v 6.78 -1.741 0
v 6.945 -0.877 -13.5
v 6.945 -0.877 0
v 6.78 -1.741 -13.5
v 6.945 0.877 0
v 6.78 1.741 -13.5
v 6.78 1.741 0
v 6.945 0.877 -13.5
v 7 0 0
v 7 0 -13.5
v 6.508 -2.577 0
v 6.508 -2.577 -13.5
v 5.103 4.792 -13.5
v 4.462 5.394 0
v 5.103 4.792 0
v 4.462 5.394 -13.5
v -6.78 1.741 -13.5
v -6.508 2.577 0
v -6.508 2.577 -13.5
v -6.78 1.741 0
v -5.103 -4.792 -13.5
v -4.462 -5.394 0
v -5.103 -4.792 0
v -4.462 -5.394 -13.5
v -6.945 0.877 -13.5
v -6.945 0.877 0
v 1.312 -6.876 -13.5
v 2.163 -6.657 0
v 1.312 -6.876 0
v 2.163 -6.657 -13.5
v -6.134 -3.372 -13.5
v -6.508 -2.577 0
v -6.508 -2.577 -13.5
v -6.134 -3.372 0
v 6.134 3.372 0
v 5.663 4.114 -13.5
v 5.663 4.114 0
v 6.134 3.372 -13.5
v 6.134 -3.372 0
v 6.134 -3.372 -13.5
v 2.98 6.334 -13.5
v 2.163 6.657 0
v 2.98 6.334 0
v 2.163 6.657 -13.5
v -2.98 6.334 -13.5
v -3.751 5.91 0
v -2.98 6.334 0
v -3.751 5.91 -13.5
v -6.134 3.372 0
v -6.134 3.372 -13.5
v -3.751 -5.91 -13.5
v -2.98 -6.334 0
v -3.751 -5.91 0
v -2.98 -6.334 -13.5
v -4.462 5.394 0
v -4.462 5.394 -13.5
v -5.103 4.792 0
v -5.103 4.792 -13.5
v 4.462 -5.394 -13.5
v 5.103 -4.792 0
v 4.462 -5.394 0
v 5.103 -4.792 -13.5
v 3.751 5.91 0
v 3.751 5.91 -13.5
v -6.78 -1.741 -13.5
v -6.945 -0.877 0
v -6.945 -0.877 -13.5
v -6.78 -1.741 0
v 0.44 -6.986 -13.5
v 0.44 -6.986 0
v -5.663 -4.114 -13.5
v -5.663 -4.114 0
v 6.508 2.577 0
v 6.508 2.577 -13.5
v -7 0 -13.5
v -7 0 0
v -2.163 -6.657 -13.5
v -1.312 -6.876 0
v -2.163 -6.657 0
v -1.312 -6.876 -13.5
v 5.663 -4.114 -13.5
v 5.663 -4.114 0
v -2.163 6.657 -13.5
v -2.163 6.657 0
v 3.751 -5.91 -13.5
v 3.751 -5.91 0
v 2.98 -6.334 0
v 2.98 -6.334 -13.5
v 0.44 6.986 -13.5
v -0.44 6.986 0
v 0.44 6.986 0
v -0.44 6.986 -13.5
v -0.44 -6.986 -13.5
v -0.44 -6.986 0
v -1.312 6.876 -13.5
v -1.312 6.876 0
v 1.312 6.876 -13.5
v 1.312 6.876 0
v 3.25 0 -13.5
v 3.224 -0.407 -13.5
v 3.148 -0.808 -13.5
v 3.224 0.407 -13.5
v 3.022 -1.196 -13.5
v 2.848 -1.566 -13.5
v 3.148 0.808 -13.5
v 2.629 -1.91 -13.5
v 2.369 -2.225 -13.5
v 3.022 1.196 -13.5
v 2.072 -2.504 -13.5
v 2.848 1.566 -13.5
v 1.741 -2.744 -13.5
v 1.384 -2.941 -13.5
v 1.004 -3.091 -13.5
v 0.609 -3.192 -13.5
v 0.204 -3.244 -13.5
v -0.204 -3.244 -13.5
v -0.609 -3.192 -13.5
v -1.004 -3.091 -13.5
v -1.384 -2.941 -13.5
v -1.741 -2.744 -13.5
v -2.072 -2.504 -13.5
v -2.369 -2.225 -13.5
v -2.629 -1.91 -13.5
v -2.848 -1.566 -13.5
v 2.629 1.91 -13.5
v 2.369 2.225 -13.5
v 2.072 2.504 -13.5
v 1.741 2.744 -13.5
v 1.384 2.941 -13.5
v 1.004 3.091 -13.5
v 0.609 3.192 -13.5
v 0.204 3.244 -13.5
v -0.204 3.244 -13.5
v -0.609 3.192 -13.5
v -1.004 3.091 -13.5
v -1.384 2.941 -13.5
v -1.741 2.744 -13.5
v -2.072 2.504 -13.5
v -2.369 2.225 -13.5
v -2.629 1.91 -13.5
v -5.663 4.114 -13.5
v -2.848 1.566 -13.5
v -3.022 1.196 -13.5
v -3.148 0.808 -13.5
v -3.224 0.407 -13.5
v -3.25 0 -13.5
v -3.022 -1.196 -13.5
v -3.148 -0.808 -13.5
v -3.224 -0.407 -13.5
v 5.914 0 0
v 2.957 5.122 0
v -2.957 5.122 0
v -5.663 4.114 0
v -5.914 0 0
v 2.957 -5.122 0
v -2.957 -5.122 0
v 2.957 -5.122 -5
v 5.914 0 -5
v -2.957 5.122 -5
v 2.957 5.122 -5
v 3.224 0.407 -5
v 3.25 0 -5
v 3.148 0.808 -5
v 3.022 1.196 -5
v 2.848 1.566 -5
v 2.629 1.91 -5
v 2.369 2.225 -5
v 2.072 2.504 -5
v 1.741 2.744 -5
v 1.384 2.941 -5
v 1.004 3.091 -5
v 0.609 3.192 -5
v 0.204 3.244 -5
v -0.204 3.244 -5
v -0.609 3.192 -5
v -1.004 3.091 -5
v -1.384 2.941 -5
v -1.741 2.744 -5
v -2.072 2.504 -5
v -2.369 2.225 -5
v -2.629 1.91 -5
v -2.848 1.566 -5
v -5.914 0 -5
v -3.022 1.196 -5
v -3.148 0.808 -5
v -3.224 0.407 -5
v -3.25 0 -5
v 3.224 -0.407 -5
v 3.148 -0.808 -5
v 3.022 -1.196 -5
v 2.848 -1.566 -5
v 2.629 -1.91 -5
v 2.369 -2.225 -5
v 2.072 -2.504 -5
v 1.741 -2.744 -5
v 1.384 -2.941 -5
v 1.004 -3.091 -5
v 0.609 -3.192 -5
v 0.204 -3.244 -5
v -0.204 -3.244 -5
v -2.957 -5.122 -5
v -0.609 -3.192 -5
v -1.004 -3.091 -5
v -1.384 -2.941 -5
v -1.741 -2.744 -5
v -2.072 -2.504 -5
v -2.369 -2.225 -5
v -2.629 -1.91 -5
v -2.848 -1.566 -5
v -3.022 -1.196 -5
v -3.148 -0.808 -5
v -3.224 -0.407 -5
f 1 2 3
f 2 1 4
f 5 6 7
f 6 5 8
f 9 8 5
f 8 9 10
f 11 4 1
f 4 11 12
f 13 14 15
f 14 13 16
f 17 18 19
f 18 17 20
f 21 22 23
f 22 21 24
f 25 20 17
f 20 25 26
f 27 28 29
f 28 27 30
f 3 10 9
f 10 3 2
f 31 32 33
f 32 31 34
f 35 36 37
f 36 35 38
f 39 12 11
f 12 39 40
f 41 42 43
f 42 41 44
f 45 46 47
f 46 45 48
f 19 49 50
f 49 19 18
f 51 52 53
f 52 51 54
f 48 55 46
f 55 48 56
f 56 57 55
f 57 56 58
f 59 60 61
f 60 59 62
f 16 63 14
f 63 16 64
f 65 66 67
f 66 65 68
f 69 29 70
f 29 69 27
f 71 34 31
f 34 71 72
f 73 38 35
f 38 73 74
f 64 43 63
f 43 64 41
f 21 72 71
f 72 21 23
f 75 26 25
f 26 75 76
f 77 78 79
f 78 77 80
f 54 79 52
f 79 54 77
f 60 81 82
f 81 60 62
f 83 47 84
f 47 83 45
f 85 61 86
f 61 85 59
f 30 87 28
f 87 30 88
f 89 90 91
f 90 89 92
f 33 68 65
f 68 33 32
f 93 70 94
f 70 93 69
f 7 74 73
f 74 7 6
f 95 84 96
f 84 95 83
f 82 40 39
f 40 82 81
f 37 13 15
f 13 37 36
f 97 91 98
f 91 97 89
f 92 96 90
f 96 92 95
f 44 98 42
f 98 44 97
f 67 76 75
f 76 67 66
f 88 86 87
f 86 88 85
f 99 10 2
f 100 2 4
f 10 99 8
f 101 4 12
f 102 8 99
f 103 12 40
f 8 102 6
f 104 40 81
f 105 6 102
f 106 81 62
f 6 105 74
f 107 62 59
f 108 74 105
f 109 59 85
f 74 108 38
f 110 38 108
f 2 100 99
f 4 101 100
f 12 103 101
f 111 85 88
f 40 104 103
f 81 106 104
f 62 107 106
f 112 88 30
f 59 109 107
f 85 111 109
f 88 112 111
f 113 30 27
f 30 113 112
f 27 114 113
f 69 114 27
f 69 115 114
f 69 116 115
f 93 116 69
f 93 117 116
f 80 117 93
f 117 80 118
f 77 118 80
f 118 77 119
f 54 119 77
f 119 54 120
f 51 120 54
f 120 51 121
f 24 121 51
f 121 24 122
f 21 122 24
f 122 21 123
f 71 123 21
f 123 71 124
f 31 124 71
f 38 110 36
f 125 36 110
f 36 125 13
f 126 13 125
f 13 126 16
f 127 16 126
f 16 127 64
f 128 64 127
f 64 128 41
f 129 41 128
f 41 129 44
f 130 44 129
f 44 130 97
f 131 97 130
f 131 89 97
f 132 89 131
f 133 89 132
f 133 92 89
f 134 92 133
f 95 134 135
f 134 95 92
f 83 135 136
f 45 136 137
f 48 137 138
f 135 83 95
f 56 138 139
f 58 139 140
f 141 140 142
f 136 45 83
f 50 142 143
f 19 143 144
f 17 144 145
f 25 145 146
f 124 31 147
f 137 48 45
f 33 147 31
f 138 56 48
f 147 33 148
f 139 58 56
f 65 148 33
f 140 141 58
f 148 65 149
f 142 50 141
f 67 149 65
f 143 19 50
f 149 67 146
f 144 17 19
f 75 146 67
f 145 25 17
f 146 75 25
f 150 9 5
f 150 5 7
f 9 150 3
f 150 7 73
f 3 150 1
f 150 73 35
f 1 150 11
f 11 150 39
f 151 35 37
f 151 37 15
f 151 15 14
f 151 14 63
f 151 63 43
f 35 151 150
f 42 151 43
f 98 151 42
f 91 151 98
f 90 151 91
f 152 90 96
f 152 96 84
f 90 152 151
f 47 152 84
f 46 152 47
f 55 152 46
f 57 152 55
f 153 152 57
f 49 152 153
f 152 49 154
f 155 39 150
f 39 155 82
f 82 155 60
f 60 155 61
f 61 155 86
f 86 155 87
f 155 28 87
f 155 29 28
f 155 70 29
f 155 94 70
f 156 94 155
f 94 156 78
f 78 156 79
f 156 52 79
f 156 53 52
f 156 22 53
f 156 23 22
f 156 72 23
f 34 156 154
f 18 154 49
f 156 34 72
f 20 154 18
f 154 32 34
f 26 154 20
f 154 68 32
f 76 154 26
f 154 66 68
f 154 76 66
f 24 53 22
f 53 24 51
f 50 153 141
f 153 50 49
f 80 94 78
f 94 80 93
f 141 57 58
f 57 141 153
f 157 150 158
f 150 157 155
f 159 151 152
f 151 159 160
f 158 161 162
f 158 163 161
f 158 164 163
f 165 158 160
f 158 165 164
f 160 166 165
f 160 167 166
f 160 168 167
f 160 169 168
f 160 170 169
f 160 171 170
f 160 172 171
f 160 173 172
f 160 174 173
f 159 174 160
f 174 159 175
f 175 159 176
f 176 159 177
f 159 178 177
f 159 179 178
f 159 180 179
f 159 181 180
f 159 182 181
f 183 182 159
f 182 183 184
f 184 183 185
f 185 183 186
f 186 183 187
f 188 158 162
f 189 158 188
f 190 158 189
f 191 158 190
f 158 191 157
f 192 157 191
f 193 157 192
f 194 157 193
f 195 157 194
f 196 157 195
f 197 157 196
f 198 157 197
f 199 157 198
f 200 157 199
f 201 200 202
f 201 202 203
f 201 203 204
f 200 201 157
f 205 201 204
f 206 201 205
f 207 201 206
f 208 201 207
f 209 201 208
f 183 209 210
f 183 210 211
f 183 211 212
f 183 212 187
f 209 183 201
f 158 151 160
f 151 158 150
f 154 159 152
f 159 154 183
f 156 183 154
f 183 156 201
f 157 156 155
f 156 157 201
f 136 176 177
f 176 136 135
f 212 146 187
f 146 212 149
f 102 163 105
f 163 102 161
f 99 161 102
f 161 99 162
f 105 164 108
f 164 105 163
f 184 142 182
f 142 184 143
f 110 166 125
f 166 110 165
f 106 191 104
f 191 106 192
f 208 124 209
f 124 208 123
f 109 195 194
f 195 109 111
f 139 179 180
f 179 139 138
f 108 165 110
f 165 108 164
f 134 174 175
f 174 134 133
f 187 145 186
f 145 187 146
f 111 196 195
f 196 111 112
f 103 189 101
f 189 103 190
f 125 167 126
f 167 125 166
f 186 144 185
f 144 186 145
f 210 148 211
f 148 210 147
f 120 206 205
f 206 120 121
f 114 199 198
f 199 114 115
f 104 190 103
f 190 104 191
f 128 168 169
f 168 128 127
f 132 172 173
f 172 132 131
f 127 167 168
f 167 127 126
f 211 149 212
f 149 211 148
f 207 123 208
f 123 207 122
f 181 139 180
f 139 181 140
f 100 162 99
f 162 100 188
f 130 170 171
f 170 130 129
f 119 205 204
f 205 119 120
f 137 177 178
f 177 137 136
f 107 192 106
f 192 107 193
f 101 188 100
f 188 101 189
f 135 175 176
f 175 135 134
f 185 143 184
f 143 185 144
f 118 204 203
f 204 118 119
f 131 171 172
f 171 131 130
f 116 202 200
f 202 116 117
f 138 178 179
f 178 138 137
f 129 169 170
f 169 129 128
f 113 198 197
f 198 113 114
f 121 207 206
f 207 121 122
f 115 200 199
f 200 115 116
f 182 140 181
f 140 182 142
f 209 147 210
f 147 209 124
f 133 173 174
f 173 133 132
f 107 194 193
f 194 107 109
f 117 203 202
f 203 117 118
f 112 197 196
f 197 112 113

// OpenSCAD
$fn = 50;


difference() {
	union() {
		translate(v = [0, 0, -13.5000000000]) {
			cylinder(h = 13.5000000000, r = 7.0000000000);
		}
		#translate(v = [0, 0, -15.0000000000]) {
			cylinder(h = 15, r = 2.8750000000);
		}
	}
	union() {
		translate(v = [0, 0, 0]) {
			rotate(a = [0, 0, 0]) {
				difference() {
					union() {
						translate(v = [0, 0, -5]) {
							linear_extrude(height = 5) {
								polygon(points = [[5.9142500000, 0.0000000000], [2.9571250000, 5.1218907443], [-2.9571250000, 5.1218907443], [-5.9142500000, 0.0000000000], [-2.9571250000, -5.1218907443], [2.9571250000, -5.1218907443]]);
							}
						}
					}
					union();
				}
			}
		}
		#translate(v = [0, 0, -100.0000000000]) {
			cylinder(h = 200, r = 3.2500000000);
		}
	}
}
